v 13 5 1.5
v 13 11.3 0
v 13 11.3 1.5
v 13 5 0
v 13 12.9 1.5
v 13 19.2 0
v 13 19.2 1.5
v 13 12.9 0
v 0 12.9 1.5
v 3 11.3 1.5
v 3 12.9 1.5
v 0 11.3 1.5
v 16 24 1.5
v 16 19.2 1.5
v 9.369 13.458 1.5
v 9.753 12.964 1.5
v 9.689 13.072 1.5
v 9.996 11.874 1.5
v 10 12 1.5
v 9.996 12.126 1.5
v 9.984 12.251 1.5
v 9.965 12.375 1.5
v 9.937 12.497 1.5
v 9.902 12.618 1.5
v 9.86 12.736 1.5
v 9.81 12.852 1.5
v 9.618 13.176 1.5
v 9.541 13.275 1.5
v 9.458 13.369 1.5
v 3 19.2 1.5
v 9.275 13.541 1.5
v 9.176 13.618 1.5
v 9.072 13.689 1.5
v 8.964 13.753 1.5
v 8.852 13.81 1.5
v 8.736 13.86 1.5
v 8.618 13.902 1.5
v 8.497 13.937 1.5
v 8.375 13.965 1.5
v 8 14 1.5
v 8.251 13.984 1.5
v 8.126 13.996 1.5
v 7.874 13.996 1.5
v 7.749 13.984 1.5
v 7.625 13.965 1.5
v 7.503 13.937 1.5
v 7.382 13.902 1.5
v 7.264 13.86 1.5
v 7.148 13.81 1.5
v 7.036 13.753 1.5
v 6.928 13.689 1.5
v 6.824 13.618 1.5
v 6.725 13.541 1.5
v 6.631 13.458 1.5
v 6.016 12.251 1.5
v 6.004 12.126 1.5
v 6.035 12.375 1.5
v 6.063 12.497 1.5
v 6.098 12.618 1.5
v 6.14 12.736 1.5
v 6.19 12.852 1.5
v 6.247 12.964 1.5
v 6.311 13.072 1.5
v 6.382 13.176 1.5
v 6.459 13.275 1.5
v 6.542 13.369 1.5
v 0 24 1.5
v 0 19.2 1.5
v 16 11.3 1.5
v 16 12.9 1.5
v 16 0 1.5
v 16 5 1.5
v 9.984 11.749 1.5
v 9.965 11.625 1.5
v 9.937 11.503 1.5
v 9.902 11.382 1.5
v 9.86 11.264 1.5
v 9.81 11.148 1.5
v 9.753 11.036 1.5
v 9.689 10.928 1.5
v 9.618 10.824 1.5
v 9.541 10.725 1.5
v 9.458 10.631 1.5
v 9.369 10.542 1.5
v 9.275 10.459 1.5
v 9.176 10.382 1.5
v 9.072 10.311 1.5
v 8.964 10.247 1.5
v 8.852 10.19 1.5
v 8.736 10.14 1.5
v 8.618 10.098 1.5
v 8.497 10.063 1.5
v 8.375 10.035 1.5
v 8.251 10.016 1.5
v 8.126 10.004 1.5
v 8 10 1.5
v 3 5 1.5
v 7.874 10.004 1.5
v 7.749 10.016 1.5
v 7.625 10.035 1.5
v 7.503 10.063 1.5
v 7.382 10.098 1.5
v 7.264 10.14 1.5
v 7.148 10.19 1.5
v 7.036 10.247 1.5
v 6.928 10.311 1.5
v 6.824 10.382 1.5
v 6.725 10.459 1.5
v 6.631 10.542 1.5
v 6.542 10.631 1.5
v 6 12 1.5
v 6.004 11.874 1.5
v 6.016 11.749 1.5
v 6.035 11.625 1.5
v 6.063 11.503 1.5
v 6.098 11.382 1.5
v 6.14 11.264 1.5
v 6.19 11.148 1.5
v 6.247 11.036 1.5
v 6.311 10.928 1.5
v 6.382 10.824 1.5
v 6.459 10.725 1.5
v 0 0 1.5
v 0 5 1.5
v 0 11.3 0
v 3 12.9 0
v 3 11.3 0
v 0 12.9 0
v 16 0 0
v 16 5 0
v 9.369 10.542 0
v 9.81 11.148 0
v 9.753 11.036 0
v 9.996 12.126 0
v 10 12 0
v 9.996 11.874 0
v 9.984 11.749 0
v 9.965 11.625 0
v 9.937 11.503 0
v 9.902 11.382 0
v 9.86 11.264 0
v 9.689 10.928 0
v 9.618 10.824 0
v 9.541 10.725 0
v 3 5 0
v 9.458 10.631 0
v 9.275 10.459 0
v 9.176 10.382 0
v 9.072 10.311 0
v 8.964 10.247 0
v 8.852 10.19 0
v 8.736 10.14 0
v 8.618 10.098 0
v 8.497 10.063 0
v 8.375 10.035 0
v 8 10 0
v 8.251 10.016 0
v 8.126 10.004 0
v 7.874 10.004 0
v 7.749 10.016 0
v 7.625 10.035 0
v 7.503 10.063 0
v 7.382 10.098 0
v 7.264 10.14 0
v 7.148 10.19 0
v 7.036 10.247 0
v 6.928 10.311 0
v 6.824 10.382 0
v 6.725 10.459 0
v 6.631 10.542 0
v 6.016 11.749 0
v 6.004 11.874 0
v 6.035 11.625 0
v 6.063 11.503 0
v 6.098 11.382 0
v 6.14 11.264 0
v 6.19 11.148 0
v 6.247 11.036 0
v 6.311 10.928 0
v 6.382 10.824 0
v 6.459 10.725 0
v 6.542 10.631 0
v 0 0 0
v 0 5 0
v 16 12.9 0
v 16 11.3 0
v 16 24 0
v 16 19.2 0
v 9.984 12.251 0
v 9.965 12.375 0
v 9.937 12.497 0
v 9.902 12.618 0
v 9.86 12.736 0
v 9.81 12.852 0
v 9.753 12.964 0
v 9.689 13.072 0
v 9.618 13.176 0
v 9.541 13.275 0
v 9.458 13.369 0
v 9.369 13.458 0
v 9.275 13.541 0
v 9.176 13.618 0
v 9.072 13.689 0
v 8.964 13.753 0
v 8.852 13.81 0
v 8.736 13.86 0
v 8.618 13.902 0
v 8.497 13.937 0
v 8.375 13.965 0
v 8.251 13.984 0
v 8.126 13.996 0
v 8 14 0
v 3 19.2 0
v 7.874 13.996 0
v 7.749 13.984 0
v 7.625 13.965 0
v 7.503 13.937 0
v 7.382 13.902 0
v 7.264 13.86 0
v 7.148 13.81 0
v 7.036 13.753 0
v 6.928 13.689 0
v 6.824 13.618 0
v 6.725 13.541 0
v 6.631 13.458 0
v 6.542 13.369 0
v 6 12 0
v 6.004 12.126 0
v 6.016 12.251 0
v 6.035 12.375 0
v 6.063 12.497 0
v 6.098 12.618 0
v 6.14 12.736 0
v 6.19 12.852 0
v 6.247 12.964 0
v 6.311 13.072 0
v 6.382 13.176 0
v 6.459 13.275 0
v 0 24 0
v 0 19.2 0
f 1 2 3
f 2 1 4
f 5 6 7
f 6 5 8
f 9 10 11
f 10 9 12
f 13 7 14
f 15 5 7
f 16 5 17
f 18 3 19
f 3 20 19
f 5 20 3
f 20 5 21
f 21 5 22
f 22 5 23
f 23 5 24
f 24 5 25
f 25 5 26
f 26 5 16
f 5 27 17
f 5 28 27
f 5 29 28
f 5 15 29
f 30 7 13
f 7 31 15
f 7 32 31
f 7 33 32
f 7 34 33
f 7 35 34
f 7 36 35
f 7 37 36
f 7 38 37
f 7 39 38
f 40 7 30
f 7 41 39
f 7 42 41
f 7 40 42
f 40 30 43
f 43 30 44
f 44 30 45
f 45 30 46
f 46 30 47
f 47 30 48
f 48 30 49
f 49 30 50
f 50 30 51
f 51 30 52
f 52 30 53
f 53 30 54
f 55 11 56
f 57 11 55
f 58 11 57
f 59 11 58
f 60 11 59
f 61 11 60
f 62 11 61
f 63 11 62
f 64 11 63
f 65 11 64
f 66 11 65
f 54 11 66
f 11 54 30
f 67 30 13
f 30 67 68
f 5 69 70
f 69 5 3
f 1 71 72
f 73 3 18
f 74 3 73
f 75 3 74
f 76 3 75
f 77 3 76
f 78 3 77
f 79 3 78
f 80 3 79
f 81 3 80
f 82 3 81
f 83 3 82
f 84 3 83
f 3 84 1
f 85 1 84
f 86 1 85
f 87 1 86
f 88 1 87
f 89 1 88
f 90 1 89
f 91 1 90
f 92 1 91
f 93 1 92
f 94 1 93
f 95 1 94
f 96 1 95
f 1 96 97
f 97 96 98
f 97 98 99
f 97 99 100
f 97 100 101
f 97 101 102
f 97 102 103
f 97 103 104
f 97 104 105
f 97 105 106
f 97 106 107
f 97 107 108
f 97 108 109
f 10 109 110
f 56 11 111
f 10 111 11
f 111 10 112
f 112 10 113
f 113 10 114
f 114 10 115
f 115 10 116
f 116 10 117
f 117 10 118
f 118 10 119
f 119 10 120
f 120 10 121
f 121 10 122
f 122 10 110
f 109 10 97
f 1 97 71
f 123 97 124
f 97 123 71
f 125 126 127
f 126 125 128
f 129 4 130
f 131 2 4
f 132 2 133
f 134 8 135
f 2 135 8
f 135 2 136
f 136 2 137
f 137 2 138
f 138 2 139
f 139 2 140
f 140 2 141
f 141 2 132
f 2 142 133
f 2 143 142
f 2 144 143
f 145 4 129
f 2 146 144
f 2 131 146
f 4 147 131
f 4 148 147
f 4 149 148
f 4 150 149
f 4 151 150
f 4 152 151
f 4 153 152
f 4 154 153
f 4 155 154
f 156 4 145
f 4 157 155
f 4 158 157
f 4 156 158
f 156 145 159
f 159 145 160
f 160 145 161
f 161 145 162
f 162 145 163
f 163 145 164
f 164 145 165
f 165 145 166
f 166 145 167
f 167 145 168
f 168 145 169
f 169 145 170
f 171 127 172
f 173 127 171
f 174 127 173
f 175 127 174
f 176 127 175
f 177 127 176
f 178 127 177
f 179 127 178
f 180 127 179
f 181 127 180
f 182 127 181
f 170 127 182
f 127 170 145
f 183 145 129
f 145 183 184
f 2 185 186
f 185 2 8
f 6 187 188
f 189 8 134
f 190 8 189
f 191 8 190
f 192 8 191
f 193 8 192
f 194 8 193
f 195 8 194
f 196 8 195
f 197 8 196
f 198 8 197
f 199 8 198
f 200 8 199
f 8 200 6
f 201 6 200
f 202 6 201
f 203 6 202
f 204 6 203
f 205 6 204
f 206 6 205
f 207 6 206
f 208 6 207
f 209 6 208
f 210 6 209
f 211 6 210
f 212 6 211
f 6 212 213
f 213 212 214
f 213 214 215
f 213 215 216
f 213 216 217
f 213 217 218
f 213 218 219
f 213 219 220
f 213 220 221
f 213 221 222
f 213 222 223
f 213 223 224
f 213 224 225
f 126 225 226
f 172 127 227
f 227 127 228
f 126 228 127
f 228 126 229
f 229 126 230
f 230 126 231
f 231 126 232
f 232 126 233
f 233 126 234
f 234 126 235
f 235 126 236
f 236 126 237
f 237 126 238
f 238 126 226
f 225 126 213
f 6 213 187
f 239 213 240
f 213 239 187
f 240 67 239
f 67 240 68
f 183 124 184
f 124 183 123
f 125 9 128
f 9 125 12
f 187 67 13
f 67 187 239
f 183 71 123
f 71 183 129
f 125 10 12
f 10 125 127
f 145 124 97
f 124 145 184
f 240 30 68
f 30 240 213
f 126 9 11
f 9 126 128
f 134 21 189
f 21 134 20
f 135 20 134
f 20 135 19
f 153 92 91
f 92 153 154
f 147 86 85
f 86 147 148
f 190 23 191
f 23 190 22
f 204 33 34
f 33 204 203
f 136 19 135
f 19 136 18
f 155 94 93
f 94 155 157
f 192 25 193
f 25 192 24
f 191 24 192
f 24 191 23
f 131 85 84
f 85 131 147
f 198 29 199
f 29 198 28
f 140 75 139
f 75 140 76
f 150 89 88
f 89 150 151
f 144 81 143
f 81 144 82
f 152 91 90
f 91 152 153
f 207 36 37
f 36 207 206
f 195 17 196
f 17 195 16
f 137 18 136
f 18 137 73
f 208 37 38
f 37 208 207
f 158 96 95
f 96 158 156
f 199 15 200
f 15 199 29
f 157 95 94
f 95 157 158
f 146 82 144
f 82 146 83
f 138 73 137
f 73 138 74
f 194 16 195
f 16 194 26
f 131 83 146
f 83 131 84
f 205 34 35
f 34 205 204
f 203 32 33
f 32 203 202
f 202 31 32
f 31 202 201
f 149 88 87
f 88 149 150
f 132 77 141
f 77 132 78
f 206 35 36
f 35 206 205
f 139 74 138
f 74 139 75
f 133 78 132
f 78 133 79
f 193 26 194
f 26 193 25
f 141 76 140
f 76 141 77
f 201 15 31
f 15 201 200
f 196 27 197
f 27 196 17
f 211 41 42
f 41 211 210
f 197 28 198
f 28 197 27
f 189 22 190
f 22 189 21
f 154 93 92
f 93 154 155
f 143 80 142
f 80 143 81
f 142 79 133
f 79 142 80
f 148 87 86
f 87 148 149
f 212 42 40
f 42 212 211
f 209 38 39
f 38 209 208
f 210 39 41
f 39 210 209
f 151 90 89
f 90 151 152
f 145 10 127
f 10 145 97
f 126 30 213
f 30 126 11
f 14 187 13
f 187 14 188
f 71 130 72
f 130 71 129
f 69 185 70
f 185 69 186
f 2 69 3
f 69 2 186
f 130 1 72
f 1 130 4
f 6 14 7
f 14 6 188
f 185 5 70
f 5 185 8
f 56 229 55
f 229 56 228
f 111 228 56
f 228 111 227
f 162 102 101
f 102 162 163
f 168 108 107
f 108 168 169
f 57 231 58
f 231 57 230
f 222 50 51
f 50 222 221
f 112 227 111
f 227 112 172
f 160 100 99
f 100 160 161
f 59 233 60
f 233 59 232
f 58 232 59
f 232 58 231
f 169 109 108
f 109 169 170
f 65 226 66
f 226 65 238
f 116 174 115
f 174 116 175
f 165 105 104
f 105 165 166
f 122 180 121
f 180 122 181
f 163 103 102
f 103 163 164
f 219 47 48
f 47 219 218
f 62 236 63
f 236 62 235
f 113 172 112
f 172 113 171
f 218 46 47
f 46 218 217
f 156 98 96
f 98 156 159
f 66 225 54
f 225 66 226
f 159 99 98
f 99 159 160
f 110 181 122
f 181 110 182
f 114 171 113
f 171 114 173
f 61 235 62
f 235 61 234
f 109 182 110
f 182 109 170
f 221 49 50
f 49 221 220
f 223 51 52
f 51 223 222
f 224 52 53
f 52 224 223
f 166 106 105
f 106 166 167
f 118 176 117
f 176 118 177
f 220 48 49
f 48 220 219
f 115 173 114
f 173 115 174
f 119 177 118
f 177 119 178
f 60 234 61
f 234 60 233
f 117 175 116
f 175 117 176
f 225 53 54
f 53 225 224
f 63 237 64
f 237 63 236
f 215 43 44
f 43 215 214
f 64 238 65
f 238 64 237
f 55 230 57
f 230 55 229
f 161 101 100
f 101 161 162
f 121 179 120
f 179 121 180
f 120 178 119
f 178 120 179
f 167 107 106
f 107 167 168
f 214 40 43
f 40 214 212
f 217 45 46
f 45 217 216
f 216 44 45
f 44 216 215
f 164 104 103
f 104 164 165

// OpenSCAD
module single(){
	difference() {
	cube(size = [13,24,1.5], center = false);
	translate(v = [-0.5,5,-.5])
		cube(size = [4,6.3,3]);
	translate(v = [-0.5,12.9,-0.5])
		cube(size = [4,6.3,3]);
	translate(v = [8,12,1])	
		cylinder (h=3, r=2, center = true, $fn=100);
	}
}

union(){
	single();
	mirror([1,0,0])
		translate(v=[-16,0,0])
			single();
}
